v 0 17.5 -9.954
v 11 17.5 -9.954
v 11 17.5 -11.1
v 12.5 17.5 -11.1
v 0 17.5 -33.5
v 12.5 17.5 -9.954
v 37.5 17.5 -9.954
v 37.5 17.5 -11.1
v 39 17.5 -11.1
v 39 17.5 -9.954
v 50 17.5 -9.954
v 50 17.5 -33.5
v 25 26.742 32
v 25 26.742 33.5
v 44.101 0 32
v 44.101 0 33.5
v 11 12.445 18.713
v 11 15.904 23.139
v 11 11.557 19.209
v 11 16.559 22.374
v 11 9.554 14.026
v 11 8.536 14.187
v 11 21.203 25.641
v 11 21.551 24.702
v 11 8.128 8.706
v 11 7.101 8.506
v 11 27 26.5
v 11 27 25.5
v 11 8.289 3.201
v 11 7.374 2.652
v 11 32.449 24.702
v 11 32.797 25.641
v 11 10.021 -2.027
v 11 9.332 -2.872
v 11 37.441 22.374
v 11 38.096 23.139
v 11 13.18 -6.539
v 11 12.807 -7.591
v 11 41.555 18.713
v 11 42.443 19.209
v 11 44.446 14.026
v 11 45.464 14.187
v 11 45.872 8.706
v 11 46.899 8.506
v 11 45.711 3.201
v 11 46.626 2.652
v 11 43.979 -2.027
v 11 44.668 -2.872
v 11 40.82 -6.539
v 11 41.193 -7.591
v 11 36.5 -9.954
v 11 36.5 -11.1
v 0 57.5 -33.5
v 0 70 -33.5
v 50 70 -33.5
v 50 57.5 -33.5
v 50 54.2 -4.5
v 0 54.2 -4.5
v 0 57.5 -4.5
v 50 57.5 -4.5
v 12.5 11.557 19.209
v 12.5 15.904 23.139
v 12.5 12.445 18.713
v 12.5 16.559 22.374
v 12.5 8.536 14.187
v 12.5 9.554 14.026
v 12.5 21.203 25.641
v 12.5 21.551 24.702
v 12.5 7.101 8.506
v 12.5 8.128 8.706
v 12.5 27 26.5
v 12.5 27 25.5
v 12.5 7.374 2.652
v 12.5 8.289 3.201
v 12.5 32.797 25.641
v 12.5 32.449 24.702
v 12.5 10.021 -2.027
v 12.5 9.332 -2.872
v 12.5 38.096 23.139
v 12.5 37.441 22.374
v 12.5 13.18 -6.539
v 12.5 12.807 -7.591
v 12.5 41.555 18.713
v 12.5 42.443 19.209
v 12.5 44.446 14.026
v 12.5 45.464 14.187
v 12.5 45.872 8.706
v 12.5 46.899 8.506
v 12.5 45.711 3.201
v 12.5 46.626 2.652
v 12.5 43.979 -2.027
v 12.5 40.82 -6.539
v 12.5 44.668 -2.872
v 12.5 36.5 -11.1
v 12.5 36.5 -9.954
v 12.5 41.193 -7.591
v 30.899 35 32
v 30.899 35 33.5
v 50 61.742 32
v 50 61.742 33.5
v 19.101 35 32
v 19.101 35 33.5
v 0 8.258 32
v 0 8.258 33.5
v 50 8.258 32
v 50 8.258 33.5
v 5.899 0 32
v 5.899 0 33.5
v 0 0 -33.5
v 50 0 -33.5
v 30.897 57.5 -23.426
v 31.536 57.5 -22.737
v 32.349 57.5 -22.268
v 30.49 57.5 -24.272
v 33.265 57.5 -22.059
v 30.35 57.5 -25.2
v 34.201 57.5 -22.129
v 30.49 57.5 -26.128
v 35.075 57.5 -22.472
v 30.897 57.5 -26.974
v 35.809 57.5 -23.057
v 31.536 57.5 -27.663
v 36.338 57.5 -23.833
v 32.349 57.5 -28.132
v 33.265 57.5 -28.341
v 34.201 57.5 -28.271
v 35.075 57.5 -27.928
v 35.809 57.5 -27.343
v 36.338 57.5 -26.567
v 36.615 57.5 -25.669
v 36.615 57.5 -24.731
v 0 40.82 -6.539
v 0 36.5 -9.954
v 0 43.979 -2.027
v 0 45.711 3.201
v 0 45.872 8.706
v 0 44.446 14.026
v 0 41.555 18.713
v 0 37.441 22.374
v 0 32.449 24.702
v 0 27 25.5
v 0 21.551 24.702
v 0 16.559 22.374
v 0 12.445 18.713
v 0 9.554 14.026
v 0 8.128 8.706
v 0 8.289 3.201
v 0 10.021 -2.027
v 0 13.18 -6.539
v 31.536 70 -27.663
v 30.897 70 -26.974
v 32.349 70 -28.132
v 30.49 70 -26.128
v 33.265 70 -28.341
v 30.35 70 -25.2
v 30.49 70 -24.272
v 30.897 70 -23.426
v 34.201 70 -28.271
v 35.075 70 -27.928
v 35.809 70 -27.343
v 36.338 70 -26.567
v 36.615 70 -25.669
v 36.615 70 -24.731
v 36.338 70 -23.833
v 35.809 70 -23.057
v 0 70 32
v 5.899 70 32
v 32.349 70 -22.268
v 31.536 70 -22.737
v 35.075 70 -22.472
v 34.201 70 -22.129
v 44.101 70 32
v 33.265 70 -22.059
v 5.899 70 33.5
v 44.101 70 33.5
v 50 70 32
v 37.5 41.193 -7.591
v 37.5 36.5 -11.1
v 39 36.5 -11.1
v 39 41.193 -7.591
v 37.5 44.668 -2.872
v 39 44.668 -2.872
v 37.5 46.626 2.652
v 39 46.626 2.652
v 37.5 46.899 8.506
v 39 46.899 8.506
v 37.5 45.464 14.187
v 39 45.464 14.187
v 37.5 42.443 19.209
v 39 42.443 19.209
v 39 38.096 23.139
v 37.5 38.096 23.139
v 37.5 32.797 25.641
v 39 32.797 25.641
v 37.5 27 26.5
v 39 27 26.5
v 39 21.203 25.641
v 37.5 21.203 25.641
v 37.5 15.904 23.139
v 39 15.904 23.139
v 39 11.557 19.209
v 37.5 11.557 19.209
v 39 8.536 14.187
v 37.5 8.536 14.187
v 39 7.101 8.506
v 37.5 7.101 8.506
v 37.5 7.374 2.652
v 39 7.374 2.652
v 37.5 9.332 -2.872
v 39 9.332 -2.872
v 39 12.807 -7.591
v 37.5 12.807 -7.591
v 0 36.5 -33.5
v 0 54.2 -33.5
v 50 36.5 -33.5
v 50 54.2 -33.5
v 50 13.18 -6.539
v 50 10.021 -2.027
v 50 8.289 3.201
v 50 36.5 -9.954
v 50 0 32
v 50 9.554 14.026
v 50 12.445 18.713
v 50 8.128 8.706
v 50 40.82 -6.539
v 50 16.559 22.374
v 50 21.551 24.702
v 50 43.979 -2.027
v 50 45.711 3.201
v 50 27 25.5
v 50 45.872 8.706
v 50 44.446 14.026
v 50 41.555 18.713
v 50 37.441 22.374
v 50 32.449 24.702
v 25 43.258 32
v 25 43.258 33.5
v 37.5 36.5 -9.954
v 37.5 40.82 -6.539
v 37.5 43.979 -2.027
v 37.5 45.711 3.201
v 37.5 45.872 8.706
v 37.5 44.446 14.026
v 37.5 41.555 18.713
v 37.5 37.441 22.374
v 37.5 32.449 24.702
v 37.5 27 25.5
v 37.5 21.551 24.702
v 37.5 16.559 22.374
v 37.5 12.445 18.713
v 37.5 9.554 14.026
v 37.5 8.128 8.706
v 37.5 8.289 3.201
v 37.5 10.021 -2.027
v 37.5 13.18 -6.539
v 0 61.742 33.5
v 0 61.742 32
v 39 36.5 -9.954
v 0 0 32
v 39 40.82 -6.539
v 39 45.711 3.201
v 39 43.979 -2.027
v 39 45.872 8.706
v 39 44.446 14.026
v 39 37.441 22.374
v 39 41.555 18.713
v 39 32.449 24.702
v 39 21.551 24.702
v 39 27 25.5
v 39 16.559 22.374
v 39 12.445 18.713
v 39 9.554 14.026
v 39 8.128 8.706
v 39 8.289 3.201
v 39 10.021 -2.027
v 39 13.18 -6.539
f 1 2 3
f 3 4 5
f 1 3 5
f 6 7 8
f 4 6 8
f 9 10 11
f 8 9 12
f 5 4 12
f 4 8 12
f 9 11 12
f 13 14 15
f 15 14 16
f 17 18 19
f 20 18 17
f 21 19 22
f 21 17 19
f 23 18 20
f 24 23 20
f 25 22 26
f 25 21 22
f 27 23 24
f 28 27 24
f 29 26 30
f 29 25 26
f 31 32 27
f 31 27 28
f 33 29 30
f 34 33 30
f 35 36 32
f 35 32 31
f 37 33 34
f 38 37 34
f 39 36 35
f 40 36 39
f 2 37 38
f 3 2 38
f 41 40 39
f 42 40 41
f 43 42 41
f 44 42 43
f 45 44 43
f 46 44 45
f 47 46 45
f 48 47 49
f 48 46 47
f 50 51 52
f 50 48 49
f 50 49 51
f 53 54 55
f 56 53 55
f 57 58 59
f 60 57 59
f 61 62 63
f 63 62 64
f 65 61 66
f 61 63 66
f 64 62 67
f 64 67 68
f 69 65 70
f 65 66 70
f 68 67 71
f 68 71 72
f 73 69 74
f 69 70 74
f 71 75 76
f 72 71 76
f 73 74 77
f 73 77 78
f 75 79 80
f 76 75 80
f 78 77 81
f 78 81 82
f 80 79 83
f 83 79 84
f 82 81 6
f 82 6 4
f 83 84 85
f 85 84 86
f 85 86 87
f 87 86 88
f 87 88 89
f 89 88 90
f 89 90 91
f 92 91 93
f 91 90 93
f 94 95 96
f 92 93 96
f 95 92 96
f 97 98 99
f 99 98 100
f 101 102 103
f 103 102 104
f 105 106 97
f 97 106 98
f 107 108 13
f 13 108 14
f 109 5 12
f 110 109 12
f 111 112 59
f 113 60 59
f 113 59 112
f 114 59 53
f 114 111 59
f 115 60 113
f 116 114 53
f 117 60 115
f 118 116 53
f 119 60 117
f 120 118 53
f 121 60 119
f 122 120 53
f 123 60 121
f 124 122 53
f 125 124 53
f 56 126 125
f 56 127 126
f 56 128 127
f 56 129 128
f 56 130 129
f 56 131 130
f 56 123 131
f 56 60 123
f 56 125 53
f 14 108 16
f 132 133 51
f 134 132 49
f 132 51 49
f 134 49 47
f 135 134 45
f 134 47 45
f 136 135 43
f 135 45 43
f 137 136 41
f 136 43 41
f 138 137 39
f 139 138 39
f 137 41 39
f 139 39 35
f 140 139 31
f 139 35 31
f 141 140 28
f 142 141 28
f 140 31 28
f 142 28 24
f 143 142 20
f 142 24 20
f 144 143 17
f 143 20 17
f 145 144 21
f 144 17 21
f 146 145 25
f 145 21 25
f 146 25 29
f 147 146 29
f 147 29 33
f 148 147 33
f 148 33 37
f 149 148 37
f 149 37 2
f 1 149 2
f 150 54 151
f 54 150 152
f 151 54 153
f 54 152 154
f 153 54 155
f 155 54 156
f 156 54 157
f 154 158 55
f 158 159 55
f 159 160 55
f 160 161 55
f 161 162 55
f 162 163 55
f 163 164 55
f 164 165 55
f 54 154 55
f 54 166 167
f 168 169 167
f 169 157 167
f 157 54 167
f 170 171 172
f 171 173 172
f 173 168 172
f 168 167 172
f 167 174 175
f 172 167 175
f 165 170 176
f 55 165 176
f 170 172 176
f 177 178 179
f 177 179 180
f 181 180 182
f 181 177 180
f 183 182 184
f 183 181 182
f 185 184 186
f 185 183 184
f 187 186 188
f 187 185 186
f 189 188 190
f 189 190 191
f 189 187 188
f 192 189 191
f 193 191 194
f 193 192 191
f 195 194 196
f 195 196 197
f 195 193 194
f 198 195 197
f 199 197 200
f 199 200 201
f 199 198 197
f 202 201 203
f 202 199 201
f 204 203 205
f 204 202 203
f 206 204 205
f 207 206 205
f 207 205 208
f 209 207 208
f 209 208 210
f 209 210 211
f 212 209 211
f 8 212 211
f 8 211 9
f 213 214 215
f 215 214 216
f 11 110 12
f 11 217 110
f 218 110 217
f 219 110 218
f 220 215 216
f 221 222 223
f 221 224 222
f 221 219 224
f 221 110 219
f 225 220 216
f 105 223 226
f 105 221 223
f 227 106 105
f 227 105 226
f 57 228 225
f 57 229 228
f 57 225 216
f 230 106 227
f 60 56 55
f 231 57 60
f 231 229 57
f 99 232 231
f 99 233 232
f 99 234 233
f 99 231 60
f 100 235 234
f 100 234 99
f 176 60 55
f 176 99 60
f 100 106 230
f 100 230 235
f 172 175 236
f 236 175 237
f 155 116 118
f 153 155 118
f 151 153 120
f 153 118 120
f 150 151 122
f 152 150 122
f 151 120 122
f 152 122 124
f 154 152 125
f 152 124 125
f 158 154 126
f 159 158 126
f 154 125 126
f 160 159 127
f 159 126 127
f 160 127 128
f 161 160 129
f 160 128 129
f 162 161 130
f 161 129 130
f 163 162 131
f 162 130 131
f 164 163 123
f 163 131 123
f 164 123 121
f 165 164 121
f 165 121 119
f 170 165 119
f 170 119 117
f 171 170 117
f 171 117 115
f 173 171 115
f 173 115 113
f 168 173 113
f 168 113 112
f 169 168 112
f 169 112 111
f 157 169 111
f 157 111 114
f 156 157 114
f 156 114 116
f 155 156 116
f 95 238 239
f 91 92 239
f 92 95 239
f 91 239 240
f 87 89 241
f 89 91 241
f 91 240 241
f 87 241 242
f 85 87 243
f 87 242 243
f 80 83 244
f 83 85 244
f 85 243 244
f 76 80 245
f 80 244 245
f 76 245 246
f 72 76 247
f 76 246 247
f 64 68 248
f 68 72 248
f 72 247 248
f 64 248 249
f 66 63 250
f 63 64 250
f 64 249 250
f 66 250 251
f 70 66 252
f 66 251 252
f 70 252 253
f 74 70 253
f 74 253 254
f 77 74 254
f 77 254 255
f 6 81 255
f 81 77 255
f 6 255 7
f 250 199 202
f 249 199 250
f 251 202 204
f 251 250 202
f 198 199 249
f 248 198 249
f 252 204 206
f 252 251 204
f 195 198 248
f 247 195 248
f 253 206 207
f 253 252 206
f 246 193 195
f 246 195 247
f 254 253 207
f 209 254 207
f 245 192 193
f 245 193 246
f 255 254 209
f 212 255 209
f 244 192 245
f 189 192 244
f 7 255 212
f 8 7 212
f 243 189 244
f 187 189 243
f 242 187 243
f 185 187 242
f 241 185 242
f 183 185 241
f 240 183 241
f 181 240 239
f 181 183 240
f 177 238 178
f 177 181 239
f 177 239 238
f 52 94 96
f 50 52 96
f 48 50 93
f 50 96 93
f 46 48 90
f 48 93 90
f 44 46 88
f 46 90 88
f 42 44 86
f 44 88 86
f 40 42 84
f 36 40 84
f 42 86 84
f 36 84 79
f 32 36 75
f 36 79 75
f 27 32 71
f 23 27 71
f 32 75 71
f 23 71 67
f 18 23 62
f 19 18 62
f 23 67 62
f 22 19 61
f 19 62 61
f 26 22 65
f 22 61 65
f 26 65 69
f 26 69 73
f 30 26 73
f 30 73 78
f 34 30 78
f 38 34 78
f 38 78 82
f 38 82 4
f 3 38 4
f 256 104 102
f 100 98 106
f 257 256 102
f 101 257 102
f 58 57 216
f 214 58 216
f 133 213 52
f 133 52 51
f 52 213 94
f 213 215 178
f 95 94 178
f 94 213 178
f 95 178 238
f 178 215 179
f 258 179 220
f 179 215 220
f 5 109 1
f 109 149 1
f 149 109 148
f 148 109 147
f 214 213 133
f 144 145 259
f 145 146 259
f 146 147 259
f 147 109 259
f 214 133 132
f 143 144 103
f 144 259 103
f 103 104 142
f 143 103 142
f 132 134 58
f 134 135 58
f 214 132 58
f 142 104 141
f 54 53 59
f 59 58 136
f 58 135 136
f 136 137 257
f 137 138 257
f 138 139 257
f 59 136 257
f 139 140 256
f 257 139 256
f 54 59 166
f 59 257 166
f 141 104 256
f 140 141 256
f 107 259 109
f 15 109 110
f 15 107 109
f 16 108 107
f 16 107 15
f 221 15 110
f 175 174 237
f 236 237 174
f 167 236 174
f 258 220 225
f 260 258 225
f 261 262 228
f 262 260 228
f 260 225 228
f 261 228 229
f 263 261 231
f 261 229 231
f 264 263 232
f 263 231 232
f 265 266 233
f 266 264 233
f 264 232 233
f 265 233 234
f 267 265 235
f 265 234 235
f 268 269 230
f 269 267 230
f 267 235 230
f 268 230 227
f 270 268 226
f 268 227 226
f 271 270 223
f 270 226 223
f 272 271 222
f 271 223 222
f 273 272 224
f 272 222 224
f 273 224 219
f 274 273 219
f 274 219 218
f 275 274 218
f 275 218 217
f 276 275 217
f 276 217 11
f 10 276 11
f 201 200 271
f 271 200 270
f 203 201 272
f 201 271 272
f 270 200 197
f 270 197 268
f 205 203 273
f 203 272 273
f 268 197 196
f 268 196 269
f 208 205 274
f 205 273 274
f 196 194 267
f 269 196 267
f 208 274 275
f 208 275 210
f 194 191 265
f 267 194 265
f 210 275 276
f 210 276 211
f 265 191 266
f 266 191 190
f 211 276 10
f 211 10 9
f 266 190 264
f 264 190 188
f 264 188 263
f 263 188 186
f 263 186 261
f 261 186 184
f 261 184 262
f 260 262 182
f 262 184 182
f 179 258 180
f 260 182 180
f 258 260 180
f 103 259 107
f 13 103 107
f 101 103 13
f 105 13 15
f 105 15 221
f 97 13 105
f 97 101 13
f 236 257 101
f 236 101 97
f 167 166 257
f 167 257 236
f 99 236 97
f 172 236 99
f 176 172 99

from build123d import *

# Parameters (mm, degrees)
SKETCH1_W                 = 50
SKETCH1_H                 = 70
BOSS_EXTRUDE1_DEPTH       = 33.5
CUT_EXTRUDE2_DEPTH        = 1.5
SKETCH3_W                 = 29
SKETCH3_H                 = 3.3
CUT_EXTRUDE3_DEPTH        = 51
CUT_EXTRUDE4_DEPTH        = 51
F_6_0MM_DOWEL_HOLE2_D     = 6.3
F_6_0MM_DOWEL_HOLE2_DEPTH = 12.5
CUT_EXTRUDE6_DEPTH        = 1.5


with BuildPart() as part:
    # Sketch1 → Boss-Extrude1 (new body, symmetric)
    with BuildSketch(Plane.XY):
        with Locations((25, 35)):
            Rectangle(SKETCH1_W, SKETCH1_H)
    extrude(amount=BOSS_EXTRUDE1_DEPTH, both=True)

    # Sketch2 → Cut-Extrude2 (cut)
    with BuildSketch(Plane.XY.offset(33.5)):
        Polygon((19.101262674, 35), (25, 43.258232256), (5.898737326, 70), (0, 70), (0, 61.741767744), align=None)
        Polygon((50, 0), (50, 8.258232256), (30.898737326, 35), (25, 26.741767744), (44.101262674, 0), align=None)
        Polygon((25, 43.258232256), (30.898737326, 35), (50, 61.741767744), (50, 70), (44.101262674, 70), align=None)
        Polygon((5.898737326, 0), (25, 26.741767744), (19.101262674, 35), (0, 8.258232256), (0, 0), align=None)
        Polygon((25, 26.741767744), (30.898737326, 35), (25, 43.258232256), (19.101262674, 35), align=None)
    extrude(amount=-CUT_EXTRUDE2_DEPTH, mode=Mode.SUBTRACT)

    # Sketch3 → Cut-Extrude3 (cut, through all)
    with BuildSketch(Plane(origin=(50, 0, 0), x_dir=(0, 0, -1), z_dir=(1, 0, 0))):
        with Locations((19, 55.85)):
            Rectangle(SKETCH3_W, SKETCH3_H)
    extrude(amount=-CUT_EXTRUDE3_DEPTH, mode=Mode.SUBTRACT)

    # Sketch4 → Cut-Extrude4 (cut, through all)
    with BuildSketch(Plane(origin=(50, 0, 0), x_dir=(0, 0, -1), z_dir=(1, 0, 0))):
        with BuildLine():
            Line((33.5, 36.5), (9.954482672, 36.5))
            ThreePointArc((9.954482672, 36.5), (-25.5, 27), (9.954482672, 17.5))
            Line((9.954482672, 17.5), (33.5, 17.5))
            Line((33.5, 17.5), (33.5, 36.5))
        make_face()
    extrude(amount=-CUT_EXTRUDE4_DEPTH, mode=Mode.SUBTRACT)

    # Ø6.0mm Dowel Hole2
    with Locations(Plane(origin=(0, 70, 0), x_dir=(1, 0, 0), z_dir=(0, 1, 0))):
        with Locations((33.5, 25.2)):
            Hole(F_6_0MM_DOWEL_HOLE2_D / 2, depth=F_6_0MM_DOWEL_HOLE2_DEPTH)

    # Sketch15 → Cut-Extrude6 (cut)
    with BuildSketch(Plane(origin=(37.5, 0, 0), x_dir=(0, 0, -1), z_dir=(1, 0, 0))):
        with BuildLine():
            Line((9.954482672, 36.5), (11.099715907, 36.5))
            ThreePointArc((11.099715907, 36.5), (-26.5, 27), (11.099715907, 17.5))
            Line((11.099715907, 17.5), (9.954482672, 17.5))
            ThreePointArc((9.954482672, 17.5), (-25.5, 27), (9.954482672, 36.5))
        make_face()
    cut_extrude6 = extrude(amount=CUT_EXTRUDE6_DEPTH, mode=Mode.SUBTRACT)

    # Mirror2: Cut-Extrude6 across plane
    add(cut_extrude6.mirror(Plane(origin=(25, 0, 0), x_dir=(0, 0, 1), z_dir=(1, 0, 0))), mode=Mode.SUBTRACT)


solid = part.part
